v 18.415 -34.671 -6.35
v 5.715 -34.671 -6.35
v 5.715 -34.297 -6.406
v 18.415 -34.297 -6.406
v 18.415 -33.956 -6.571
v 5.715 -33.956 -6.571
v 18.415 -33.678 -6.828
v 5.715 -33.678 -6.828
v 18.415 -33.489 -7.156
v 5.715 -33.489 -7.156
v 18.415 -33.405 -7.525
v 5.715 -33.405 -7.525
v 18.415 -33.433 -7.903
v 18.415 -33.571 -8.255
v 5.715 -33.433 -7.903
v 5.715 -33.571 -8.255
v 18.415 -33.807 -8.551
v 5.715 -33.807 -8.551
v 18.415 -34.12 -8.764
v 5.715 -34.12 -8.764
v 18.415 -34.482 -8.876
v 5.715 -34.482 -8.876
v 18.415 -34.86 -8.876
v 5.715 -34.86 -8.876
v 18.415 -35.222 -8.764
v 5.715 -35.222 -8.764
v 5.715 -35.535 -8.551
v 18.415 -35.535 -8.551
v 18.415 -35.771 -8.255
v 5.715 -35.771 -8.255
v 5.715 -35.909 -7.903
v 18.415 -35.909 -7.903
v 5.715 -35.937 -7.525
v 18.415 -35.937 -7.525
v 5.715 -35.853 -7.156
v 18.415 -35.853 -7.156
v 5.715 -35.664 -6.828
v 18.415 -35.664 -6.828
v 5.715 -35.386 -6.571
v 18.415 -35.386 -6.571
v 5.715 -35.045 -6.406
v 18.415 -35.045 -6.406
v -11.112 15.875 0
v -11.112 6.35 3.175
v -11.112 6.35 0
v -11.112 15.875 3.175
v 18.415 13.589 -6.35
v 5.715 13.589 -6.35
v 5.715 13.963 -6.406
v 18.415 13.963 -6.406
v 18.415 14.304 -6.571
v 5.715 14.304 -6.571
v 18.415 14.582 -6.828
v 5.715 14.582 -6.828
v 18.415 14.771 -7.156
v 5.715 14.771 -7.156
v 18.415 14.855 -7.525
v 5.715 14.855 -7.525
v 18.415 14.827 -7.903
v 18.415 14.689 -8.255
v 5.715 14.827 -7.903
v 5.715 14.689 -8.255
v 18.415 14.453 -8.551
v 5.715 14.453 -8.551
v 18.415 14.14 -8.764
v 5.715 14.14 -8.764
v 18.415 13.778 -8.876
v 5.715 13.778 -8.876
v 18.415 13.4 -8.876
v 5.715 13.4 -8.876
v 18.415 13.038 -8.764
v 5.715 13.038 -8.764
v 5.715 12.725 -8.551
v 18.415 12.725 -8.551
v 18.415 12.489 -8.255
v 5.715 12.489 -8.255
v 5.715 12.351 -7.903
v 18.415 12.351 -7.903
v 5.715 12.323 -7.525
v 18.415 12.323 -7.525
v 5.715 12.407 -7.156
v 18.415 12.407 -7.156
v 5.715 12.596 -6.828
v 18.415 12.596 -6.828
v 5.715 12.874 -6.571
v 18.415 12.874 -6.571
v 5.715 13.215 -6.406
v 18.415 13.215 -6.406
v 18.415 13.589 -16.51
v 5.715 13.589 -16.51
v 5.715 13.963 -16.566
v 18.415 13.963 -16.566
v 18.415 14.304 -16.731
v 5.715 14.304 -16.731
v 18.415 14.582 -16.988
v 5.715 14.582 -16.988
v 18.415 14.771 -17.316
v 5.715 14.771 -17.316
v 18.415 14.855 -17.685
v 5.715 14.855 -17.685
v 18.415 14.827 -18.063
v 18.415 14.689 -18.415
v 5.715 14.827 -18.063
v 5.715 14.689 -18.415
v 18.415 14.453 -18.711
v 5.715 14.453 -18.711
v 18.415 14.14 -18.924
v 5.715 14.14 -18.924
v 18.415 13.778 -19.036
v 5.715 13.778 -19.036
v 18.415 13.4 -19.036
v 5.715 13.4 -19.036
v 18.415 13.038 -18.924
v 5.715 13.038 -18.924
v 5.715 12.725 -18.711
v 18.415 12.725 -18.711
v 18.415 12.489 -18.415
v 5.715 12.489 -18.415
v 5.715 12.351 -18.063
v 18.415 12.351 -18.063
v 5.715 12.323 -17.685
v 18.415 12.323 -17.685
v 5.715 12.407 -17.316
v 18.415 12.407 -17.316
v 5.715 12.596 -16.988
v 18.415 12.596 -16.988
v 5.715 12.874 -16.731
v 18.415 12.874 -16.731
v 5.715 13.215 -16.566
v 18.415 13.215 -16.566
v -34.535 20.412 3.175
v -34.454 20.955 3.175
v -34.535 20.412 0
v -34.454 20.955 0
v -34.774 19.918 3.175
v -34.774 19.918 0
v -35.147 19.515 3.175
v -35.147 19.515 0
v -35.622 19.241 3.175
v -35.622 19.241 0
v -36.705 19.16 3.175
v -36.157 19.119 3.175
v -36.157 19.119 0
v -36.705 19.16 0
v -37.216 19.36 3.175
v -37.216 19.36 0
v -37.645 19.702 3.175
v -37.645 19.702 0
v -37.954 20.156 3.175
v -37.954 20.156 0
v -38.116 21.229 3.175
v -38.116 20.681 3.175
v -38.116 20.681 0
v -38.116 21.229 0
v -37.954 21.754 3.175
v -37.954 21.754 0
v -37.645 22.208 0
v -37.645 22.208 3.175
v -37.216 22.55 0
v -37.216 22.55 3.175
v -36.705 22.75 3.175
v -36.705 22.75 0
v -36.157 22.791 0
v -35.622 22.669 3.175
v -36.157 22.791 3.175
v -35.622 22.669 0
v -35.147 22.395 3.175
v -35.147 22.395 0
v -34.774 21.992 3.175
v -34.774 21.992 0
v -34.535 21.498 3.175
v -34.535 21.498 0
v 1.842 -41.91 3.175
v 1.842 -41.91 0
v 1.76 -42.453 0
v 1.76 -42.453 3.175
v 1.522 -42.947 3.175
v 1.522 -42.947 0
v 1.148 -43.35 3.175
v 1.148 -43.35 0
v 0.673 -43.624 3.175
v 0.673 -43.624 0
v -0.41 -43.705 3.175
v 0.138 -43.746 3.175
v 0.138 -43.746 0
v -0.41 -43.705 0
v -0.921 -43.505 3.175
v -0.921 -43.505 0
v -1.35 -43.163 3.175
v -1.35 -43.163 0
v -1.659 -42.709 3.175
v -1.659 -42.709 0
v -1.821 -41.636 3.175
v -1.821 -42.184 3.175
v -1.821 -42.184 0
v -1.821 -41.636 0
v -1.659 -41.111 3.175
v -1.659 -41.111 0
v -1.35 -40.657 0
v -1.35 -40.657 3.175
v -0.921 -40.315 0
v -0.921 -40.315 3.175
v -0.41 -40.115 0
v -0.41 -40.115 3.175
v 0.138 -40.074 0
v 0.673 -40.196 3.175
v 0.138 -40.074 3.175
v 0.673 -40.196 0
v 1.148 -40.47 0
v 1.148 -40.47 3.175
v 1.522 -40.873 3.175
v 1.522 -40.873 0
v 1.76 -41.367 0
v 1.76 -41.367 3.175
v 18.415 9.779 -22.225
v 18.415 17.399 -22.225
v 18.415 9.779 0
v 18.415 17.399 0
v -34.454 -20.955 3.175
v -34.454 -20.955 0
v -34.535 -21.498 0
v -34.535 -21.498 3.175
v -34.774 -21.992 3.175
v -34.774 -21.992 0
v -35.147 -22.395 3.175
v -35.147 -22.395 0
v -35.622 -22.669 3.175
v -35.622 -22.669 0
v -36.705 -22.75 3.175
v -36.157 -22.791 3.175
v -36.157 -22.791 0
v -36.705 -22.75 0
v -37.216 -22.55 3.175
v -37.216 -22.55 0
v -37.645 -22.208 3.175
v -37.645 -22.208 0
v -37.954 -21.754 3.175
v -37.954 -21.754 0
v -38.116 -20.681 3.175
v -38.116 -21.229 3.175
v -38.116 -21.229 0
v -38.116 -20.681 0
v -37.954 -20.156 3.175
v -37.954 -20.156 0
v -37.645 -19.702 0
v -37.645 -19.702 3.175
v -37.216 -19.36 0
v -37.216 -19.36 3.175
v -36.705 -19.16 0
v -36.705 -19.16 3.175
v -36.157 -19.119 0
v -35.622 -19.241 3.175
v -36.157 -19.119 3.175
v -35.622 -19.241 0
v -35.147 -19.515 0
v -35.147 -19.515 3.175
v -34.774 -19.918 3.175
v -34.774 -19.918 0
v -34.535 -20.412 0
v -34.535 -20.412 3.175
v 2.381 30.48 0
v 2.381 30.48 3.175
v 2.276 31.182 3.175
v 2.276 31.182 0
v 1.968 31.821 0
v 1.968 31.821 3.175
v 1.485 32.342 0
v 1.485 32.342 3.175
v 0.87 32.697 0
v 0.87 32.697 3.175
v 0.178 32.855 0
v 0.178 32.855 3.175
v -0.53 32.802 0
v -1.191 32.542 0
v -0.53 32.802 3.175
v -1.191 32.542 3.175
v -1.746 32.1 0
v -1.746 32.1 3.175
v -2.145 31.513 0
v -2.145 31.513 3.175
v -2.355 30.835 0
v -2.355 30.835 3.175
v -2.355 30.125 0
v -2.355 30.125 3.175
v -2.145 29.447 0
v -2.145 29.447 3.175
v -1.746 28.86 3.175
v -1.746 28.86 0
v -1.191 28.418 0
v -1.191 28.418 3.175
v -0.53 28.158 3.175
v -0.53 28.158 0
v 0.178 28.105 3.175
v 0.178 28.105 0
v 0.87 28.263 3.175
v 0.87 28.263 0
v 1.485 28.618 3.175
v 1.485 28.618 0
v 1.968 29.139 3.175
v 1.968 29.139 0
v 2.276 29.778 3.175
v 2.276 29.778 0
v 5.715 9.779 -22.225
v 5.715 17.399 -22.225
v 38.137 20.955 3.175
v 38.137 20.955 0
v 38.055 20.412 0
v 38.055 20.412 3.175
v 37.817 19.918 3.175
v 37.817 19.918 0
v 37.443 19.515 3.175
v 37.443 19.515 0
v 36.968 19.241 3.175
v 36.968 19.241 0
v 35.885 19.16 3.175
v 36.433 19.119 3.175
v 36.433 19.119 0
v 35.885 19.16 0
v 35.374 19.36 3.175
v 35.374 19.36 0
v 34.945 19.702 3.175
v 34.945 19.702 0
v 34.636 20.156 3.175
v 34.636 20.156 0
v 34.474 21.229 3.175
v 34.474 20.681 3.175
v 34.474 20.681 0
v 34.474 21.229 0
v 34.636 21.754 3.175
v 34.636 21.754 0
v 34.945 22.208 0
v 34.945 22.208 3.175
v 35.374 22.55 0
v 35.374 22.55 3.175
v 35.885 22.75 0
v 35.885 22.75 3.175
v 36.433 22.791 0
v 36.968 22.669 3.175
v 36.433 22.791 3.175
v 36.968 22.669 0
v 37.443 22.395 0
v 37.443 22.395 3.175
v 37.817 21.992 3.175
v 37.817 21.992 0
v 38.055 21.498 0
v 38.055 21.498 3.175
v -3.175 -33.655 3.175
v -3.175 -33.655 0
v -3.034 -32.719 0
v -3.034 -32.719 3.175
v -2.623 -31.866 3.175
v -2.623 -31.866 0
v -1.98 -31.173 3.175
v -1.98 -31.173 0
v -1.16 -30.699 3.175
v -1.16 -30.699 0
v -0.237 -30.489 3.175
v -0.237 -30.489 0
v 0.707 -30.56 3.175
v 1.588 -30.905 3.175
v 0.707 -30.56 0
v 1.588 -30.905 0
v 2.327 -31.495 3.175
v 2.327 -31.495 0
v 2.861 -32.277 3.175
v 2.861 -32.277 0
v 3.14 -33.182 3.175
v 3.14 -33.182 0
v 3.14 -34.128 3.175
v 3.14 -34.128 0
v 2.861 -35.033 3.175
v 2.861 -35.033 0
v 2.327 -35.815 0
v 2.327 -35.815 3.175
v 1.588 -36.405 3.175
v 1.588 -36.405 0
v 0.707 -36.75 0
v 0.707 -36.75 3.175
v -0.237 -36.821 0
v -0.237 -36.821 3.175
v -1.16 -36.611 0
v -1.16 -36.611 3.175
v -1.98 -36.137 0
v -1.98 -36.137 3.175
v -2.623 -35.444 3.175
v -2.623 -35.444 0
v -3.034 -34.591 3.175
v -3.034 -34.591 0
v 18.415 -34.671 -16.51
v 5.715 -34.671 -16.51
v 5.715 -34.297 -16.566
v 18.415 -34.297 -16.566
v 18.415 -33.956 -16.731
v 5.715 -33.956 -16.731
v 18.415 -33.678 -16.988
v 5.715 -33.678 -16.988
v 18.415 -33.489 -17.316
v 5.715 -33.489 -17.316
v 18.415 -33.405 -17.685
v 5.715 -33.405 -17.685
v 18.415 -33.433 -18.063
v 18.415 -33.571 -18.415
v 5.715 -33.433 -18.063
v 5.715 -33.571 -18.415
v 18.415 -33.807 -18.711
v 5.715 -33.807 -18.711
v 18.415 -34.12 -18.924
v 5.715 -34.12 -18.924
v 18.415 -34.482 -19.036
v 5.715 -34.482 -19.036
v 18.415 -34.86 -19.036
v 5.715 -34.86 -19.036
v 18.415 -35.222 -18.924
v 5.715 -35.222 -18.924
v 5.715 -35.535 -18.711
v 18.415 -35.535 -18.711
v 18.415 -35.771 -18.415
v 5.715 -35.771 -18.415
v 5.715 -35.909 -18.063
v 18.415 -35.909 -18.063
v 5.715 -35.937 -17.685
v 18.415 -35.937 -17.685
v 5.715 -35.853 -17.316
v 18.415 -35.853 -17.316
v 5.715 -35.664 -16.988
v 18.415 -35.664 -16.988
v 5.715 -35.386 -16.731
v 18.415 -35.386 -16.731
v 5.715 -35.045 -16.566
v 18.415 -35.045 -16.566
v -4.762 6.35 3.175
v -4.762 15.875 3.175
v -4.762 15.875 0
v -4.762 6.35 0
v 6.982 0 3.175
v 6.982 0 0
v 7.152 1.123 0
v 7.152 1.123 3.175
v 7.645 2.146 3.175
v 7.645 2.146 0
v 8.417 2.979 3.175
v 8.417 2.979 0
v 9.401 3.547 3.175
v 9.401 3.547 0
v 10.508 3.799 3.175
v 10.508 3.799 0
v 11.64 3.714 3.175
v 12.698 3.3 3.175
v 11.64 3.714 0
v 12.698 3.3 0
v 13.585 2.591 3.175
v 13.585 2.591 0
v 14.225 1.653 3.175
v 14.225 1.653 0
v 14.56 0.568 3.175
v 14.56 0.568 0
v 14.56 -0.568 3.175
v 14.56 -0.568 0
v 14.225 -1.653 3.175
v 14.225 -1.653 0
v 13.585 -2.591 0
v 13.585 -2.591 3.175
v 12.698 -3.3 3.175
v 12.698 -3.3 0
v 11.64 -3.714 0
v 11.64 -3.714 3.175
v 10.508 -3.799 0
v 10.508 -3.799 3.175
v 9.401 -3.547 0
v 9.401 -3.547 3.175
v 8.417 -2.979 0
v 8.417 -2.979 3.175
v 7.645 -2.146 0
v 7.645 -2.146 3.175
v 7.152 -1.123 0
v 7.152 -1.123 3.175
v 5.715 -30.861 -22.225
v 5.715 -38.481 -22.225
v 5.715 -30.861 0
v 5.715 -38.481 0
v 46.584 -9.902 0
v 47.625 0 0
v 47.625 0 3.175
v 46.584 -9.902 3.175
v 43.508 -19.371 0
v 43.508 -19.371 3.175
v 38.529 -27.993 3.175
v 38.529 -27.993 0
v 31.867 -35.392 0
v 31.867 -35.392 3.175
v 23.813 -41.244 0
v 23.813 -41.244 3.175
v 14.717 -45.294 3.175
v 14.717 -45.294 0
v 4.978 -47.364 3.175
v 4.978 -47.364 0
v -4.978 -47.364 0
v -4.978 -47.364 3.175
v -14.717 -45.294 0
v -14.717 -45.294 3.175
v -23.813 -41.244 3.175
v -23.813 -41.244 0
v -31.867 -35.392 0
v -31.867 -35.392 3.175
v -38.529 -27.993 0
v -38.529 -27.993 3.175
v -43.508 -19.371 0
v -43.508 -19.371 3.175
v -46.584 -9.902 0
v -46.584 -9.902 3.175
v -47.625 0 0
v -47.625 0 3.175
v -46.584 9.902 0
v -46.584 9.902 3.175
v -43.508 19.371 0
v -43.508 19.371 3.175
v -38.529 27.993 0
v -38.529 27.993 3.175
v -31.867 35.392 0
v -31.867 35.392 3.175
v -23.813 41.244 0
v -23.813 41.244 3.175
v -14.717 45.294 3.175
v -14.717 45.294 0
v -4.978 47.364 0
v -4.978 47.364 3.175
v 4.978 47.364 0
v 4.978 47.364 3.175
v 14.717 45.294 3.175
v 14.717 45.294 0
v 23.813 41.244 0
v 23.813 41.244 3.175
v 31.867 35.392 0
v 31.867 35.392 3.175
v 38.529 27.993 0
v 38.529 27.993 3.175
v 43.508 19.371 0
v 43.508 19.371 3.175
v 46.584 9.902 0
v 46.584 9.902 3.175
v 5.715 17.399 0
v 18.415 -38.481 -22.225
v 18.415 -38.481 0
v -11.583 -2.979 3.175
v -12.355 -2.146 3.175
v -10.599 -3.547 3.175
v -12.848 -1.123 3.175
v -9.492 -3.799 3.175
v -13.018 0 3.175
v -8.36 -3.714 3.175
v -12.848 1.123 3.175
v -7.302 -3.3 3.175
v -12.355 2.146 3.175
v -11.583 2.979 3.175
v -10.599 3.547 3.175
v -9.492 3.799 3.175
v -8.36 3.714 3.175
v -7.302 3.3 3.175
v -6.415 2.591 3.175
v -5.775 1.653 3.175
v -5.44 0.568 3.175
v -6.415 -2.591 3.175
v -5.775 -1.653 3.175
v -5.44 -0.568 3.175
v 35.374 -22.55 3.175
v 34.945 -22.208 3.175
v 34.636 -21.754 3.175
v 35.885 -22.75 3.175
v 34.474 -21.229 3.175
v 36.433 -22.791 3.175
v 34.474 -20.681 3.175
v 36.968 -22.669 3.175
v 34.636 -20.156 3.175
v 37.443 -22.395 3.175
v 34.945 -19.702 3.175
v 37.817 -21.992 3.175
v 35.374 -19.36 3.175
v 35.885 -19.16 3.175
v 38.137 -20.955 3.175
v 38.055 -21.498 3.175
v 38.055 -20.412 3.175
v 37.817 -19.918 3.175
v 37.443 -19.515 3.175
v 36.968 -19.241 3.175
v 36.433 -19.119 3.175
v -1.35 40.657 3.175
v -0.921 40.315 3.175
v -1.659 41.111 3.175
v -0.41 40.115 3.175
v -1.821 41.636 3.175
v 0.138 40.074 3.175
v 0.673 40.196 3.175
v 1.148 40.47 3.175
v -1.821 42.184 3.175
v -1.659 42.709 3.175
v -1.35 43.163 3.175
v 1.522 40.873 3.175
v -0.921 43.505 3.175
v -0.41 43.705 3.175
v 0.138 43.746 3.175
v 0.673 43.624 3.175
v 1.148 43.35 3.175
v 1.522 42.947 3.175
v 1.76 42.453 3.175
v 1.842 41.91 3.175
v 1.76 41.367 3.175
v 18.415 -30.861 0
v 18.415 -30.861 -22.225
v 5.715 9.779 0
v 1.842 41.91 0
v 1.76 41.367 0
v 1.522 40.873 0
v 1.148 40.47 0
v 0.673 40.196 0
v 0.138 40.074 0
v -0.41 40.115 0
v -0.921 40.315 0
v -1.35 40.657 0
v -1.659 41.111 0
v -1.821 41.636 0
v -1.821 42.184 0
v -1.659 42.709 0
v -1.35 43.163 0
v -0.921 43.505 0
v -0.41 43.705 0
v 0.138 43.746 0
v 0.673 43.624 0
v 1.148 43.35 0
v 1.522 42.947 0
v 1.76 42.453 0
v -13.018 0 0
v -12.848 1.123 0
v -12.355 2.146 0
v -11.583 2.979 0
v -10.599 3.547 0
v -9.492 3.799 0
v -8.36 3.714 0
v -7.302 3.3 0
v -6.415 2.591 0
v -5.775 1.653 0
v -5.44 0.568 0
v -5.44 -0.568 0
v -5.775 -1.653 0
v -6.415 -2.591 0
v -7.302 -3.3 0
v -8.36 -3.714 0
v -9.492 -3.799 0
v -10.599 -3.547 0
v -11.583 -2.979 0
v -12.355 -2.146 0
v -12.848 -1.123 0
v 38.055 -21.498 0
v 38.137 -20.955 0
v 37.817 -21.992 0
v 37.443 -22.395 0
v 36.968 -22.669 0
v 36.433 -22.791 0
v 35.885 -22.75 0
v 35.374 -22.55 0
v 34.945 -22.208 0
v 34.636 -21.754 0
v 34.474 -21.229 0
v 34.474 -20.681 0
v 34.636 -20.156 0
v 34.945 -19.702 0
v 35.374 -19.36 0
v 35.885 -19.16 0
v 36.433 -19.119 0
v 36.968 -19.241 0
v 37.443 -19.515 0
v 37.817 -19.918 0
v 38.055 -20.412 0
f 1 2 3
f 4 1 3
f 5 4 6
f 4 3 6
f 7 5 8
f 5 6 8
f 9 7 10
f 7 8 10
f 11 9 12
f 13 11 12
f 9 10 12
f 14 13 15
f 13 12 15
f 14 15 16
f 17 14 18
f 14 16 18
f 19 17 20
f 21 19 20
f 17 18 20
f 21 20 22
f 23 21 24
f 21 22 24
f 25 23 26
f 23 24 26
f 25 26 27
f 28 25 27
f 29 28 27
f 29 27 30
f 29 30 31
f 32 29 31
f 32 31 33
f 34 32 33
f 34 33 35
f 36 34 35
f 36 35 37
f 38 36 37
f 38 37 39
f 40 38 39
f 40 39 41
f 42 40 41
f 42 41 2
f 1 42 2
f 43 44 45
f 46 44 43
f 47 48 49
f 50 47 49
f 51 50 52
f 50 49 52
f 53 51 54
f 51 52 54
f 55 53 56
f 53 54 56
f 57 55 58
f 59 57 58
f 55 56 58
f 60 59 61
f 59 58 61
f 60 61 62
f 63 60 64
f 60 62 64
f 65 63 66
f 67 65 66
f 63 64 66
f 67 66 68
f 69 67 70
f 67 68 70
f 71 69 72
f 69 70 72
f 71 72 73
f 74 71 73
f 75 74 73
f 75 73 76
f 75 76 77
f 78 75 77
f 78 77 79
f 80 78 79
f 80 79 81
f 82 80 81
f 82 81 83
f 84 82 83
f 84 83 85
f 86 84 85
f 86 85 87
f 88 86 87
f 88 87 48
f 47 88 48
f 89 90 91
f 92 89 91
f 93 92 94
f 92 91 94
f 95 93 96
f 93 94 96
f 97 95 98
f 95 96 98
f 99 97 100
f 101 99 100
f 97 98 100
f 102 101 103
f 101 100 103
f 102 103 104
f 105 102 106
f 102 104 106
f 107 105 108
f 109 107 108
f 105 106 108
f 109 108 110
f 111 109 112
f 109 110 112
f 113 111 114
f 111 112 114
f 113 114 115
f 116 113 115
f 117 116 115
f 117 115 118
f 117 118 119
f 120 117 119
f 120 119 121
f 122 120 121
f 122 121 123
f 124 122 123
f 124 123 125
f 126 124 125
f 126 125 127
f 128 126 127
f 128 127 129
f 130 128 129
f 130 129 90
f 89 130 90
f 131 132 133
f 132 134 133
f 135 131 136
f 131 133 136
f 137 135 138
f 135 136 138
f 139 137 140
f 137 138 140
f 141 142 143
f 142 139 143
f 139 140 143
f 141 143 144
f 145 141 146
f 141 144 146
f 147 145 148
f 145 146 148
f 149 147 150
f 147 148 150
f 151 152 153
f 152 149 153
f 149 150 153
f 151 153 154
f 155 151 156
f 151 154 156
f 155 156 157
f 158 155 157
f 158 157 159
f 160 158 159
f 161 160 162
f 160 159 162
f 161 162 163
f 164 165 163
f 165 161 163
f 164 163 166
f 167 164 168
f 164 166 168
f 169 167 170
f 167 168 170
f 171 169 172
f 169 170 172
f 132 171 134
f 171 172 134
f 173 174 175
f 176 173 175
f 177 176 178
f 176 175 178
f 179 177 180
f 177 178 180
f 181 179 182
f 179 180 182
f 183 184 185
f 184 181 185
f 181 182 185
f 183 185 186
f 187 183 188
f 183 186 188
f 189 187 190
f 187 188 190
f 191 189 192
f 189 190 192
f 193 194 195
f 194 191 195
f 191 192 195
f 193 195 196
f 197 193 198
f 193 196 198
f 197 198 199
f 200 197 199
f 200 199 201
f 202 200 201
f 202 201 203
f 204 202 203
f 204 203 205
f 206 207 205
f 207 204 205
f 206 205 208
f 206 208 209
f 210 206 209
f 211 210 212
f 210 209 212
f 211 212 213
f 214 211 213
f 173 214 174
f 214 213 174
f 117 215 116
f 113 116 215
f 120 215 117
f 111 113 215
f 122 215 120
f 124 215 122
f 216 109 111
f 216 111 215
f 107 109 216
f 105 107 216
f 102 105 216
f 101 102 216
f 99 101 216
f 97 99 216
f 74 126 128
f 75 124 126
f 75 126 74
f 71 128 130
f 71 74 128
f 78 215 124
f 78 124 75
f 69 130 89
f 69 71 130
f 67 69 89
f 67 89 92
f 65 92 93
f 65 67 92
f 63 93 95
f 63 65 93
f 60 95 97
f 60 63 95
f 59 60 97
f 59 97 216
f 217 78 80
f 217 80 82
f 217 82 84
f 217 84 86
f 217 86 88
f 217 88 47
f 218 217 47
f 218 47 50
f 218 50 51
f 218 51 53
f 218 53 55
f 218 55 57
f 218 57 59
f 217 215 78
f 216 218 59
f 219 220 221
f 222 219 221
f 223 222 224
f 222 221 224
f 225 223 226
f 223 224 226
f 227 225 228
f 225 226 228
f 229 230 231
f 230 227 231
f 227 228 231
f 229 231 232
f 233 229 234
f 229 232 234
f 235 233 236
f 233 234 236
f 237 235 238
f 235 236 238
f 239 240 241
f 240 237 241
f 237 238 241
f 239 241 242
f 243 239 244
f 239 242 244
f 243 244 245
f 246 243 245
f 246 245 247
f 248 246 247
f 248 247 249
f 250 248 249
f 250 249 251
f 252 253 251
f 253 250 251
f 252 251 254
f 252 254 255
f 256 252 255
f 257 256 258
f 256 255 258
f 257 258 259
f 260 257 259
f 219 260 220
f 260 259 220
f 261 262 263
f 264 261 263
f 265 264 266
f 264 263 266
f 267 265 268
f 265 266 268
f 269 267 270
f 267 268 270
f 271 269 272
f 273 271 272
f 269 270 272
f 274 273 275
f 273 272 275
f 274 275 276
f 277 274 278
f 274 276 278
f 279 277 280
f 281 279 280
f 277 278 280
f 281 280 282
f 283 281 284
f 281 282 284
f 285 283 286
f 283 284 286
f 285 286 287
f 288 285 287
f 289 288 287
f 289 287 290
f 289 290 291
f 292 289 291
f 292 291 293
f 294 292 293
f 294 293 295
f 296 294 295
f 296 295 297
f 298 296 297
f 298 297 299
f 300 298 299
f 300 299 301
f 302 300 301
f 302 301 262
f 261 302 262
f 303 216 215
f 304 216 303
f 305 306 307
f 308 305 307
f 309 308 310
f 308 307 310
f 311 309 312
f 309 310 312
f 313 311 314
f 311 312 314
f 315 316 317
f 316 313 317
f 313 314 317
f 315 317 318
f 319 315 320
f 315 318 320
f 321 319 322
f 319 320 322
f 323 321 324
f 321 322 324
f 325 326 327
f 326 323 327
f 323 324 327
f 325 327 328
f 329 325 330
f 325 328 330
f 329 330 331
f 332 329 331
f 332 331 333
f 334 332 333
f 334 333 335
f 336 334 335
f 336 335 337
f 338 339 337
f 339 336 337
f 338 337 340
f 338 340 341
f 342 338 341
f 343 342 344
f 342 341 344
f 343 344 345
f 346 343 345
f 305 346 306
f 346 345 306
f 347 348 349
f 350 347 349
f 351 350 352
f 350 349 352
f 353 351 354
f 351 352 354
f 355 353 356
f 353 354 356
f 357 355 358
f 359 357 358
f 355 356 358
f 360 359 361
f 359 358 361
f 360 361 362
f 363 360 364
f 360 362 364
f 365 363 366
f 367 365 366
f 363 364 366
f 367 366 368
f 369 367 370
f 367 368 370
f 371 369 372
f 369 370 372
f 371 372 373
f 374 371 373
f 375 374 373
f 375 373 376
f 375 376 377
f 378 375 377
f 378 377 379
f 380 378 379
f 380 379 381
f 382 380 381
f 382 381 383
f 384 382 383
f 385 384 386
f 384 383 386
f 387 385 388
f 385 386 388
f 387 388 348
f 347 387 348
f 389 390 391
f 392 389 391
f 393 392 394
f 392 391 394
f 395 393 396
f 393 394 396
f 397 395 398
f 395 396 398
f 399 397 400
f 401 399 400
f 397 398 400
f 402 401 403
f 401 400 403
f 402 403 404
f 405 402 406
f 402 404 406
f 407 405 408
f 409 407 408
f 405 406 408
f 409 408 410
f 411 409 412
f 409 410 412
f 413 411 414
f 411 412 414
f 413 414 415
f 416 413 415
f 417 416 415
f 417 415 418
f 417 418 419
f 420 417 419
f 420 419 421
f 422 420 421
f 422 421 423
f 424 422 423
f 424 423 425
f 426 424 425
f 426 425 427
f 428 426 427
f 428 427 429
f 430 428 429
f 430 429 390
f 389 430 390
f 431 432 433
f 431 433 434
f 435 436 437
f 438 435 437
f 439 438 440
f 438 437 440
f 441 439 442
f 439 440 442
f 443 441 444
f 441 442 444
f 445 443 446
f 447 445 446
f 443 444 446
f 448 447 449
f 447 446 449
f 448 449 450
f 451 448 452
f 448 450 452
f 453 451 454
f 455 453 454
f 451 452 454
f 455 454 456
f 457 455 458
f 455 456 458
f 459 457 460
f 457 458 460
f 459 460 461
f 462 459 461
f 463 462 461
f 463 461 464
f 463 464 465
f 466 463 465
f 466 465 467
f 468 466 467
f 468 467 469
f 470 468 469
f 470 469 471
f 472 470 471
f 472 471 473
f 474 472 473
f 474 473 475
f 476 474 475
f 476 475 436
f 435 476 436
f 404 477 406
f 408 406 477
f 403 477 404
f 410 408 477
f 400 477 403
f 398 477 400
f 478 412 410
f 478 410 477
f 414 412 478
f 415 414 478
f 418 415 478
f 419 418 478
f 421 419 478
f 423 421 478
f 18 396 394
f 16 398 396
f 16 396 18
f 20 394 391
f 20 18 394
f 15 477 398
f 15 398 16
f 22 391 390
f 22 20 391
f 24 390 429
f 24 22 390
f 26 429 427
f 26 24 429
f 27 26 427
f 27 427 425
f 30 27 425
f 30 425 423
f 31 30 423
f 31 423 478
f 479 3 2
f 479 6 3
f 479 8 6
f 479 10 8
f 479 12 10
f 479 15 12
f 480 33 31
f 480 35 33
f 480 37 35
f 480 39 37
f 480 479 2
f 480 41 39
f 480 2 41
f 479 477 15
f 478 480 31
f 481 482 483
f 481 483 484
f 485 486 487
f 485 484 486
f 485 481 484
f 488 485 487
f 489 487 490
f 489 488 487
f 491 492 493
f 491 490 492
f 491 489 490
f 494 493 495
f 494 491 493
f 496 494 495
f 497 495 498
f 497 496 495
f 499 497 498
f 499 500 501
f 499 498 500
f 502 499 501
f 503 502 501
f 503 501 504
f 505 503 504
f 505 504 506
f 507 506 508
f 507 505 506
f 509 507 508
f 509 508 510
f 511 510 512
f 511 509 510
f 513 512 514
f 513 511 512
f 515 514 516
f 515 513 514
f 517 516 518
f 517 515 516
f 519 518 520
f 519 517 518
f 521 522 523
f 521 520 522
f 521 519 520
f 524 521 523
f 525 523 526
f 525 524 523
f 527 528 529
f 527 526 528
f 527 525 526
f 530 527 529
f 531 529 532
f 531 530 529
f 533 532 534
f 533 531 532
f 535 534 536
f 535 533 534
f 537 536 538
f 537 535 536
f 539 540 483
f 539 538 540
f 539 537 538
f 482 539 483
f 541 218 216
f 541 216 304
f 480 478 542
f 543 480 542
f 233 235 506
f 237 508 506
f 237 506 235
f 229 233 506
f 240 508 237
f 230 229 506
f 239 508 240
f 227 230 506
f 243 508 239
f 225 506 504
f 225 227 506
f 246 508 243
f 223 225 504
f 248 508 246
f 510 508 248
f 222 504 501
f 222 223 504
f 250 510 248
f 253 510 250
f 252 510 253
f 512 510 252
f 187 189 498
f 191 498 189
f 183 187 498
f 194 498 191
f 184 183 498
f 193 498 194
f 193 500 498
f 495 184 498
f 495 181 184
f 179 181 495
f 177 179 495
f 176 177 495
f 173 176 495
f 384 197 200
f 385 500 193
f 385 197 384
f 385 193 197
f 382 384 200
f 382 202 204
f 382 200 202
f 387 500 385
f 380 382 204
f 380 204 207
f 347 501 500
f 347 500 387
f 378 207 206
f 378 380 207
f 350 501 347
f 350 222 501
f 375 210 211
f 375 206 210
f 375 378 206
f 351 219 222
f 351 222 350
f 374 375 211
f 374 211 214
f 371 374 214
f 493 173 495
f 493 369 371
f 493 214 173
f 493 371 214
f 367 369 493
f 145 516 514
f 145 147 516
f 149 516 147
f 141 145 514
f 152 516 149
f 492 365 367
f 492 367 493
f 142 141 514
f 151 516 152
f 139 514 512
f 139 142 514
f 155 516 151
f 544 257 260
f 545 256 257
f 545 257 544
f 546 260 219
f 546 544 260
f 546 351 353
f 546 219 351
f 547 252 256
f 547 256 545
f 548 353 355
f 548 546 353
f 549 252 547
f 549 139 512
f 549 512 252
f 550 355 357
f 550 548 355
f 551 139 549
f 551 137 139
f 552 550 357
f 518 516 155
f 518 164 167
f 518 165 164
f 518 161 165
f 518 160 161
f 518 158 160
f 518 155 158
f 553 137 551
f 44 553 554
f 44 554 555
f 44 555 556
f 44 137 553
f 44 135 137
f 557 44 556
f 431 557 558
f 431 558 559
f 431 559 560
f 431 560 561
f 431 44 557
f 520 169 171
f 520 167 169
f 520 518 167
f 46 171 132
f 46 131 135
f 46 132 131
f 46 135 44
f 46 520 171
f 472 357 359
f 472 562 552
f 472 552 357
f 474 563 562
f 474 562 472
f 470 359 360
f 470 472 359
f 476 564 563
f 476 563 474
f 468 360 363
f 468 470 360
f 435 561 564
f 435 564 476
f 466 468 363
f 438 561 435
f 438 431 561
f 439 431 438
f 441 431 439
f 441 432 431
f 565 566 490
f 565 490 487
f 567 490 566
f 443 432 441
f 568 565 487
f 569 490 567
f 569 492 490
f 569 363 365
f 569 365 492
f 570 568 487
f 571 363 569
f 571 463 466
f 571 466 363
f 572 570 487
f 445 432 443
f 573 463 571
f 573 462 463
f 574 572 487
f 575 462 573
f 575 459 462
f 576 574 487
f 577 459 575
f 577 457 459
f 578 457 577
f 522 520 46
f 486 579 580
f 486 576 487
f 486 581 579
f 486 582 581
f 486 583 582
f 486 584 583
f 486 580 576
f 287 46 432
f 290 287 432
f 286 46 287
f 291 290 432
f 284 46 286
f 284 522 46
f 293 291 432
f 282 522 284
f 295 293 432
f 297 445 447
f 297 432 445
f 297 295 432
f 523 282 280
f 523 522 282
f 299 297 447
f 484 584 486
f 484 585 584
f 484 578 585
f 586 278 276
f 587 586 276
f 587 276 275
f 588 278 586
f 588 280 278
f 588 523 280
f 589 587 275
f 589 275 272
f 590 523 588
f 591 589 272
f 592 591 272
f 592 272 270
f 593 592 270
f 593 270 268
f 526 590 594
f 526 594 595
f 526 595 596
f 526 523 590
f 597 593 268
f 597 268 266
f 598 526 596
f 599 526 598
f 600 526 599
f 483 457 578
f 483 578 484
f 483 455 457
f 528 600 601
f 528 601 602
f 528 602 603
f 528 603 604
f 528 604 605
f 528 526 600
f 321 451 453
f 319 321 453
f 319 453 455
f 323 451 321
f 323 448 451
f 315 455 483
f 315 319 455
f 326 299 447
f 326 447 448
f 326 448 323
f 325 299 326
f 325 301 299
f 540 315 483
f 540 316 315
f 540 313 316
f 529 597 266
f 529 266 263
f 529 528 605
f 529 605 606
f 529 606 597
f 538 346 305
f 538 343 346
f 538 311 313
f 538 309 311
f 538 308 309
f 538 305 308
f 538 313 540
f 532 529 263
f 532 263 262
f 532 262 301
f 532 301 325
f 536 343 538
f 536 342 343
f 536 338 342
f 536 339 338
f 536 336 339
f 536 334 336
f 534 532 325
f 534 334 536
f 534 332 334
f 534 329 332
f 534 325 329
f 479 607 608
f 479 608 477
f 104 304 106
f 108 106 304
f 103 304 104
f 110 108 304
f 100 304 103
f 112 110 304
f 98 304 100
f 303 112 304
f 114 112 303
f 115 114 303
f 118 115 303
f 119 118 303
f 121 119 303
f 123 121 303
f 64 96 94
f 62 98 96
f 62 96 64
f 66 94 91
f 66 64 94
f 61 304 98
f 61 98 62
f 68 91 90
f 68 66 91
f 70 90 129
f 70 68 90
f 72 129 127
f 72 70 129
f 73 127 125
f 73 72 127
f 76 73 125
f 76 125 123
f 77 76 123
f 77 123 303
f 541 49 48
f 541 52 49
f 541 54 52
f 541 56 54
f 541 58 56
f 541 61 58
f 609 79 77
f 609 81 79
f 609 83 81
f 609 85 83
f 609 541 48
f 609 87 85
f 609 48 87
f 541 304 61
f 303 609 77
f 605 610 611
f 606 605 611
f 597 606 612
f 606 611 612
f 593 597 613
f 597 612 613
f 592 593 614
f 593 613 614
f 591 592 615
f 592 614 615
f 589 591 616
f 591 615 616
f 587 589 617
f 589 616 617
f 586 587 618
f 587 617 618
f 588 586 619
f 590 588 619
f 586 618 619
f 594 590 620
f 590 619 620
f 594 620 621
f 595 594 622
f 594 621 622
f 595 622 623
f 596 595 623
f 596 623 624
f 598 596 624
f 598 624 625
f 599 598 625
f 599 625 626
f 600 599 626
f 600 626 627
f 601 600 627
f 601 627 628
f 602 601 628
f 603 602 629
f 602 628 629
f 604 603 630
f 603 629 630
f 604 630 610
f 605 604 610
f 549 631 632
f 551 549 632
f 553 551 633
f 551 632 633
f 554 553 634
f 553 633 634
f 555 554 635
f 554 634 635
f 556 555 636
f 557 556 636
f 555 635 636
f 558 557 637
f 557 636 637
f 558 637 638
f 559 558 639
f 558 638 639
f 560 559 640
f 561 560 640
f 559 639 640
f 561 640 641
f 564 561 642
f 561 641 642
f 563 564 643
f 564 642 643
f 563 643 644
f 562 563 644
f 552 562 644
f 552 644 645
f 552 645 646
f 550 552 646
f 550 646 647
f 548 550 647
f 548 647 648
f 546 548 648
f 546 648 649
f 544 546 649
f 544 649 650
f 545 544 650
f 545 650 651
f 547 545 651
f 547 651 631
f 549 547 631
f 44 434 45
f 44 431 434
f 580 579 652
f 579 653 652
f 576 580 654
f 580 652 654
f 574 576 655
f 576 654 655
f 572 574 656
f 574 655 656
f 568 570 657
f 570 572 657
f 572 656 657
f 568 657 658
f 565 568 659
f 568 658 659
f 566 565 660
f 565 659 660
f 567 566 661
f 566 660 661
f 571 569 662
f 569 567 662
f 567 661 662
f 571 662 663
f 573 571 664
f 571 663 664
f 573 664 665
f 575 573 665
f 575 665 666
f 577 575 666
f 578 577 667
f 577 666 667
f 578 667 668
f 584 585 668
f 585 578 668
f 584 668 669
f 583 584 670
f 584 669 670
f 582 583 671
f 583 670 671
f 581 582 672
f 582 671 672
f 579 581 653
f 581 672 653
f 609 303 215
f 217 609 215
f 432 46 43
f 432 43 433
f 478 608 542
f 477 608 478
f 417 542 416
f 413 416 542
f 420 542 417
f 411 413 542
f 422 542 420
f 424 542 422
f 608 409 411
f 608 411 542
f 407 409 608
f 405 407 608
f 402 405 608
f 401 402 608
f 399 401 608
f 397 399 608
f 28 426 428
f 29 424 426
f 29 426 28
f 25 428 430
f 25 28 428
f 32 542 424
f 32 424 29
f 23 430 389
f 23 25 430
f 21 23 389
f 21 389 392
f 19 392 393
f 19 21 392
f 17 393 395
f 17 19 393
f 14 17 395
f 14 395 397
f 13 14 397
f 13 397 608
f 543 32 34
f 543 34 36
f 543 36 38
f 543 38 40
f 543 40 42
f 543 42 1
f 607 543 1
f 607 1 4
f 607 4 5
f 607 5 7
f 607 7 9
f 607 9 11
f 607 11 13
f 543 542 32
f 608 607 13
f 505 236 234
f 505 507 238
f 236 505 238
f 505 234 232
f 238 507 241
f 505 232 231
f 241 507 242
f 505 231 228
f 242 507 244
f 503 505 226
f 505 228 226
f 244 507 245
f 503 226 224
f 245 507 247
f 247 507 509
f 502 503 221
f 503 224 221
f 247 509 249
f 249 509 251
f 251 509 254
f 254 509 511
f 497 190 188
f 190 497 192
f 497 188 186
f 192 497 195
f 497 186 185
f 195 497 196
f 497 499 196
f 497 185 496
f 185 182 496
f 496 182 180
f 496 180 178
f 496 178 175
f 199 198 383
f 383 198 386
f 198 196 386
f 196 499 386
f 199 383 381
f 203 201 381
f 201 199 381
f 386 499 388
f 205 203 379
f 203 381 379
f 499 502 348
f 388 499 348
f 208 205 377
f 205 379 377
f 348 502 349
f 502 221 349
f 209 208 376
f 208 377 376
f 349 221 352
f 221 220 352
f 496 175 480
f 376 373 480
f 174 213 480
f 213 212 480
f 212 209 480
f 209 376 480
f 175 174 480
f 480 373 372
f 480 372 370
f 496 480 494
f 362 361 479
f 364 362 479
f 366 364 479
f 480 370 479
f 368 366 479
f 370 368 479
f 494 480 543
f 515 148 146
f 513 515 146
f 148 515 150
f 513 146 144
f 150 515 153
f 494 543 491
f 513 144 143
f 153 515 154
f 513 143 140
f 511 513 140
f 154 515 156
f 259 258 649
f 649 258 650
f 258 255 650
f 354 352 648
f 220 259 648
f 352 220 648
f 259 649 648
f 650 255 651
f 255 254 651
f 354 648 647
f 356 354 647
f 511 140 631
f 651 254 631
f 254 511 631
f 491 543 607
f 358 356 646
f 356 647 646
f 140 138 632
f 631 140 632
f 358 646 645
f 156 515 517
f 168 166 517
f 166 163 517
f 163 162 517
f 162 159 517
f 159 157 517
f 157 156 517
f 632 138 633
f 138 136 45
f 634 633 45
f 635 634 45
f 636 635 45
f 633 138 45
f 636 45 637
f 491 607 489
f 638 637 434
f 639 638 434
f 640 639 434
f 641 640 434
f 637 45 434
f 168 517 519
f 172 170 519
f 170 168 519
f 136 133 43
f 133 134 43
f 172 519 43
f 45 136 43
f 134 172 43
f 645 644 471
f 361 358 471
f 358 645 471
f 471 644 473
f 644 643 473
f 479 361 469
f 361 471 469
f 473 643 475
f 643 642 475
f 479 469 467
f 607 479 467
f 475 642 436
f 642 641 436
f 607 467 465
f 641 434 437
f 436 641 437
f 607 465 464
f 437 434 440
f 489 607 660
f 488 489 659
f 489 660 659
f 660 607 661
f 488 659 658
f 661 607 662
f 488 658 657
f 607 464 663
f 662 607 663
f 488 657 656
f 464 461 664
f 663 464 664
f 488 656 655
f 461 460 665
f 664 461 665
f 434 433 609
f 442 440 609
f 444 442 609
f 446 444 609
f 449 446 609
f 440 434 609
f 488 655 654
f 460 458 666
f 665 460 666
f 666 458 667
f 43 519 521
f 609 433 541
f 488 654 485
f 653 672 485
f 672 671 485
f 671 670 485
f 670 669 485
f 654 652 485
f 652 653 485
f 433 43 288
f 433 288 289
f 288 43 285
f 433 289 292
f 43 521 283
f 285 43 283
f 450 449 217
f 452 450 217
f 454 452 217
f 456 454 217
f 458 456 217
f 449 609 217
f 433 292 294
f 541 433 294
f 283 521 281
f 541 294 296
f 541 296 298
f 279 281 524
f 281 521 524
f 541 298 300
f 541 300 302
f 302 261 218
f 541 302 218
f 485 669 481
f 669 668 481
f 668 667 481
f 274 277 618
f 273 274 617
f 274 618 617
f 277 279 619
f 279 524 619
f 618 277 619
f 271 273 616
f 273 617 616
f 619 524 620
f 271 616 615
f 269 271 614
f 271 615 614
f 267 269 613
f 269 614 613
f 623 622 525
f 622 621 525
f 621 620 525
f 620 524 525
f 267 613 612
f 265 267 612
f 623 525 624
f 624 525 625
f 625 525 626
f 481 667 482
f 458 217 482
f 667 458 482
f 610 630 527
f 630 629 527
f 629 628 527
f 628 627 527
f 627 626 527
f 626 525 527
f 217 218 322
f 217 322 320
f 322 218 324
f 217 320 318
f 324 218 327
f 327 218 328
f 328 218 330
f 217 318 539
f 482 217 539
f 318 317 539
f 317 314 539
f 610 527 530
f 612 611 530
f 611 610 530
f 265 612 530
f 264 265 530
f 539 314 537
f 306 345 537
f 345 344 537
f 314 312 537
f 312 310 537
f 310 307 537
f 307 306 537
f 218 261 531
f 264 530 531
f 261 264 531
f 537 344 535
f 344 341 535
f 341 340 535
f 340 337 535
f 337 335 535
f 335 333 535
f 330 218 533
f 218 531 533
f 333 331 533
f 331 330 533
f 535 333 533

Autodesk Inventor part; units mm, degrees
ref_plane "YZ Plane" through (0, 0, 0) normal (1, 0, 0) x (0, 1, 0)
ref_plane "XZ Plane" through (0, 0, 0) normal (0, 1, 0) x (-1, 0, 0)
ref_plane "XY Plane" through (0, 0, 0) normal (0, 0, 1) x (1, 0, 0)
sketch "Sketch1" plane through (0, 0, 0) normal (0, 0, 1) x (1, 0, 0)
  circle A0 centre (0, 0) radius 47.625
  line L0 (0, 0) -> (0, 41.91)
  line L1 (0, 0) -> (41.91, 0) construction
  circle A1 centre (0, 41.91) radius 1.8415
  circle A2 centre (-36.2951, 20.955) radius 1.8415
  circle A3 centre (-36.2951, -20.955) radius 1.8415
  circle A4 centre (0, -41.91) radius 1.8415
  circle A5 centre (36.2951, -20.955) radius 1.8415
  circle A6 centre (36.2951, 20.955) radius 1.8415
  dimension "d0" = 95.25
  dimension "d1" = 41.91
  dimension "d2" = 90
  dimension "d3" = 3.683
  dimension "d6" = 360
extrude "Extrusion1" add sketch "Sketch1" along normal blind 3.175
sketch "Sketch2" plane through (0, 0, 0) normal (0, 0, -1) x (-1, 0, 0)
  line L0 (-18.415, 17.399) -> (-5.715, 17.399)
  line L1 (-5.715, 17.399) -> (-5.715, 9.779)
  line L2 (-5.715, 9.779) -> (-18.415, 9.779)
  line L3 (-18.415, 9.779) -> (-18.415, 17.399)
  line L4 (-18.415, -30.861) -> (-5.715, -30.861)
  line L5 (-5.715, -30.861) -> (-5.715, -38.481)
  line L6 (-5.715, -38.481) -> (-18.415, -38.481)
  line L7 (-18.415, -38.481) -> (-18.415, -30.861)
  point P0 (0, 0)
  dimension "d10" = 40.64
  dimension "d11" = 9.779
  dimension "d12" = 7.62
  dimension "d13" = 7.62
  dimension "d14" = 12.7
  dimension "d31" = 5.715
extrude "Extrusion2" add sketch "Sketch2" along normal blind 22.225
sketch "Sketch3" plane through (0, 0, 3.175) normal (0, 0, 1) x (1, 0, 0)
  line L0 (-11.1125, 15.875) -> (-4.7625, 15.875)
  line L1 (-4.7625, 15.875) -> (-4.7625, 6.35)
  line L2 (-4.7625, 6.35) -> (-11.1125, 6.35)
  line L3 (-11.1125, 6.35) -> (-11.1125, 15.875)
  point P0 (0, 0)
  dimension "d18" = 6.35
  dimension "d19" = 9.525
  dimension "d33" = 4.7625
  dimension "d34" = 6.35
extrude "Extrusion3" cut sketch "Sketch3" against normal blind 19.05
sketch "Sketch4" plane through (5.715, -38.481, 0) normal (-1, 0, 0) x (0, 0, 1)
  line L0 (0, 7.62) -> (0, 0) projected
  line L1 (0, 7.62) -> (-22.225, 7.62) projected
  line L2 (-22.225, 0) -> (-22.225, 7.62) projected
  line L3 (0, 0) -> (-22.225, 0) projected
  circle A0 centre (-17.78, 3.81) radius 1.27
  circle A1 centre (-7.62, 3.81) radius 1.27
  line L4 (0, 7.62) -> (-22.225, 7.62) projected
  line L5 (0, 55.88) -> (0, 48.26) projected
  line L6 (0, 55.88) -> (-22.225, 55.88) projected
  line L7 (-22.225, 48.26) -> (-22.225, 55.88) projected
  line L8 (0, 48.26) -> (-22.225, 48.26) projected
  circle A2 centre (-17.78, 52.07) radius 1.27
  circle A3 centre (-7.62, 52.07) radius 1.27
  point P0 (0, 38.481)
  dimension "d22" = 2.54
  dimension "d23" = 2.54
  dimension "d24" = 3.81
  dimension "d25" = 10.16
  dimension "d27" = 2.54
  dimension "d28" = 2.54
  dimension "d32" = 4.445
extrude "Extrusion4" cut sketch "Sketch4" against normal blind 19.05 contours A0 | A1 | A2 | A3
sketch "Sketch8" plane through (0, 0, 0) normal (0, 0, -1) x (-1, 0, 0)
  line L0 (11.1125, 15.875) -> (11.1125, 6.35) projected
  line L1 (11.1125, 6.35) -> (4.7625, 6.35) projected
  line L2 (4.7625, 6.35) -> (4.7625, 15.875) projected
  line L3 (4.7625, 15.875) -> (11.1125, 15.875) projected
  line L4 (-5.715, 17.399) -> (-5.715, 9.779) projected
  line L5 (-5.715, 9.779) -> (-18.415, 9.779) projected
  line L6 (-18.415, 9.779) -> (-18.415, 17.399) projected
  line L7 (-18.415, 17.399) -> (-5.715, 17.399) projected
  line L8 (-5.715, -30.861) -> (-5.715, -38.481) projected
  line L9 (-5.715, -38.481) -> (-18.415, -38.481) projected
  line L10 (-18.415, -38.481) -> (-18.415, -30.861) projected
  line L11 (-18.415, -30.861) -> (-5.715, -30.861) projected
  circle A0 centre (-36.2951, 20.955) radius 1.8415 projected
  circle A1 centre (-36.2951, -20.955) radius 1.8415 projected
  circle A2 centre (0, -41.91) radius 1.8415 projected
  circle A3 centre (36.2951, -20.955) radius 1.8415 projected
  circle A4 centre (36.2951, 20.955) radius 1.8415 projected
  circle A5 centre (0, 41.91) radius 1.8415 projected
  circle A6 centre (0, 0) radius 47.625 projected
  circle A7 centre (9.2075, 0) radius 3.81
  circle A8 centre (-10.7925, 0) radius 3.81
  dimension "d42" = 7.62
  dimension "d43" = 6.35
  dimension "d44" = 1.905
  dimension "d45" = 7.62
  dimension "d46" = 20
extrude "Extrusion6" cut sketch "Sketch8" against normal blind 25.4 contours A7 | A8
sketch "Sketch10" plane through (0, 0, 3.175) normal (0, 0, 1) x (1, 0, 0)
  circle A0 centre (0, 30.48) radius 2.3813
  point P0 (0, 0)
  dimension "d53" = 4.7625
  dimension "d54" = 30.48
extrude "Extrusion8" cut sketch "Sketch10" against normal through all
sketch "Sketch11" plane through (0, 0, 0) normal (0, 0, -1) x (-1, 0, 0)
  circle A0 centre (0, -33.655) radius 3.175
  point P0 (0, 0)
  dimension "d57" = 6.35
  dimension "d58" = 33.655
extrude "Extrusion9" cut sketch "Sketch11" against normal blind 25.4
sketch "Sketch9" plane through (0, 0, 3.175) normal (0, 0, 1) x (1, 0, 0)
  circle A0 centre (0, 0) radius 47.625
  circle A1 centre (0, 0) radius 47.625 projected
  circle A2 centre (0, 0) radius 47.117
  dimension "d49" = 95.25
  dimension "d50" = 94.234
extrude "PRINT_FEATURE_1" [suppressed]
properties part number "foreElectronicsSealingWallRear" material "ABS Plastic"
